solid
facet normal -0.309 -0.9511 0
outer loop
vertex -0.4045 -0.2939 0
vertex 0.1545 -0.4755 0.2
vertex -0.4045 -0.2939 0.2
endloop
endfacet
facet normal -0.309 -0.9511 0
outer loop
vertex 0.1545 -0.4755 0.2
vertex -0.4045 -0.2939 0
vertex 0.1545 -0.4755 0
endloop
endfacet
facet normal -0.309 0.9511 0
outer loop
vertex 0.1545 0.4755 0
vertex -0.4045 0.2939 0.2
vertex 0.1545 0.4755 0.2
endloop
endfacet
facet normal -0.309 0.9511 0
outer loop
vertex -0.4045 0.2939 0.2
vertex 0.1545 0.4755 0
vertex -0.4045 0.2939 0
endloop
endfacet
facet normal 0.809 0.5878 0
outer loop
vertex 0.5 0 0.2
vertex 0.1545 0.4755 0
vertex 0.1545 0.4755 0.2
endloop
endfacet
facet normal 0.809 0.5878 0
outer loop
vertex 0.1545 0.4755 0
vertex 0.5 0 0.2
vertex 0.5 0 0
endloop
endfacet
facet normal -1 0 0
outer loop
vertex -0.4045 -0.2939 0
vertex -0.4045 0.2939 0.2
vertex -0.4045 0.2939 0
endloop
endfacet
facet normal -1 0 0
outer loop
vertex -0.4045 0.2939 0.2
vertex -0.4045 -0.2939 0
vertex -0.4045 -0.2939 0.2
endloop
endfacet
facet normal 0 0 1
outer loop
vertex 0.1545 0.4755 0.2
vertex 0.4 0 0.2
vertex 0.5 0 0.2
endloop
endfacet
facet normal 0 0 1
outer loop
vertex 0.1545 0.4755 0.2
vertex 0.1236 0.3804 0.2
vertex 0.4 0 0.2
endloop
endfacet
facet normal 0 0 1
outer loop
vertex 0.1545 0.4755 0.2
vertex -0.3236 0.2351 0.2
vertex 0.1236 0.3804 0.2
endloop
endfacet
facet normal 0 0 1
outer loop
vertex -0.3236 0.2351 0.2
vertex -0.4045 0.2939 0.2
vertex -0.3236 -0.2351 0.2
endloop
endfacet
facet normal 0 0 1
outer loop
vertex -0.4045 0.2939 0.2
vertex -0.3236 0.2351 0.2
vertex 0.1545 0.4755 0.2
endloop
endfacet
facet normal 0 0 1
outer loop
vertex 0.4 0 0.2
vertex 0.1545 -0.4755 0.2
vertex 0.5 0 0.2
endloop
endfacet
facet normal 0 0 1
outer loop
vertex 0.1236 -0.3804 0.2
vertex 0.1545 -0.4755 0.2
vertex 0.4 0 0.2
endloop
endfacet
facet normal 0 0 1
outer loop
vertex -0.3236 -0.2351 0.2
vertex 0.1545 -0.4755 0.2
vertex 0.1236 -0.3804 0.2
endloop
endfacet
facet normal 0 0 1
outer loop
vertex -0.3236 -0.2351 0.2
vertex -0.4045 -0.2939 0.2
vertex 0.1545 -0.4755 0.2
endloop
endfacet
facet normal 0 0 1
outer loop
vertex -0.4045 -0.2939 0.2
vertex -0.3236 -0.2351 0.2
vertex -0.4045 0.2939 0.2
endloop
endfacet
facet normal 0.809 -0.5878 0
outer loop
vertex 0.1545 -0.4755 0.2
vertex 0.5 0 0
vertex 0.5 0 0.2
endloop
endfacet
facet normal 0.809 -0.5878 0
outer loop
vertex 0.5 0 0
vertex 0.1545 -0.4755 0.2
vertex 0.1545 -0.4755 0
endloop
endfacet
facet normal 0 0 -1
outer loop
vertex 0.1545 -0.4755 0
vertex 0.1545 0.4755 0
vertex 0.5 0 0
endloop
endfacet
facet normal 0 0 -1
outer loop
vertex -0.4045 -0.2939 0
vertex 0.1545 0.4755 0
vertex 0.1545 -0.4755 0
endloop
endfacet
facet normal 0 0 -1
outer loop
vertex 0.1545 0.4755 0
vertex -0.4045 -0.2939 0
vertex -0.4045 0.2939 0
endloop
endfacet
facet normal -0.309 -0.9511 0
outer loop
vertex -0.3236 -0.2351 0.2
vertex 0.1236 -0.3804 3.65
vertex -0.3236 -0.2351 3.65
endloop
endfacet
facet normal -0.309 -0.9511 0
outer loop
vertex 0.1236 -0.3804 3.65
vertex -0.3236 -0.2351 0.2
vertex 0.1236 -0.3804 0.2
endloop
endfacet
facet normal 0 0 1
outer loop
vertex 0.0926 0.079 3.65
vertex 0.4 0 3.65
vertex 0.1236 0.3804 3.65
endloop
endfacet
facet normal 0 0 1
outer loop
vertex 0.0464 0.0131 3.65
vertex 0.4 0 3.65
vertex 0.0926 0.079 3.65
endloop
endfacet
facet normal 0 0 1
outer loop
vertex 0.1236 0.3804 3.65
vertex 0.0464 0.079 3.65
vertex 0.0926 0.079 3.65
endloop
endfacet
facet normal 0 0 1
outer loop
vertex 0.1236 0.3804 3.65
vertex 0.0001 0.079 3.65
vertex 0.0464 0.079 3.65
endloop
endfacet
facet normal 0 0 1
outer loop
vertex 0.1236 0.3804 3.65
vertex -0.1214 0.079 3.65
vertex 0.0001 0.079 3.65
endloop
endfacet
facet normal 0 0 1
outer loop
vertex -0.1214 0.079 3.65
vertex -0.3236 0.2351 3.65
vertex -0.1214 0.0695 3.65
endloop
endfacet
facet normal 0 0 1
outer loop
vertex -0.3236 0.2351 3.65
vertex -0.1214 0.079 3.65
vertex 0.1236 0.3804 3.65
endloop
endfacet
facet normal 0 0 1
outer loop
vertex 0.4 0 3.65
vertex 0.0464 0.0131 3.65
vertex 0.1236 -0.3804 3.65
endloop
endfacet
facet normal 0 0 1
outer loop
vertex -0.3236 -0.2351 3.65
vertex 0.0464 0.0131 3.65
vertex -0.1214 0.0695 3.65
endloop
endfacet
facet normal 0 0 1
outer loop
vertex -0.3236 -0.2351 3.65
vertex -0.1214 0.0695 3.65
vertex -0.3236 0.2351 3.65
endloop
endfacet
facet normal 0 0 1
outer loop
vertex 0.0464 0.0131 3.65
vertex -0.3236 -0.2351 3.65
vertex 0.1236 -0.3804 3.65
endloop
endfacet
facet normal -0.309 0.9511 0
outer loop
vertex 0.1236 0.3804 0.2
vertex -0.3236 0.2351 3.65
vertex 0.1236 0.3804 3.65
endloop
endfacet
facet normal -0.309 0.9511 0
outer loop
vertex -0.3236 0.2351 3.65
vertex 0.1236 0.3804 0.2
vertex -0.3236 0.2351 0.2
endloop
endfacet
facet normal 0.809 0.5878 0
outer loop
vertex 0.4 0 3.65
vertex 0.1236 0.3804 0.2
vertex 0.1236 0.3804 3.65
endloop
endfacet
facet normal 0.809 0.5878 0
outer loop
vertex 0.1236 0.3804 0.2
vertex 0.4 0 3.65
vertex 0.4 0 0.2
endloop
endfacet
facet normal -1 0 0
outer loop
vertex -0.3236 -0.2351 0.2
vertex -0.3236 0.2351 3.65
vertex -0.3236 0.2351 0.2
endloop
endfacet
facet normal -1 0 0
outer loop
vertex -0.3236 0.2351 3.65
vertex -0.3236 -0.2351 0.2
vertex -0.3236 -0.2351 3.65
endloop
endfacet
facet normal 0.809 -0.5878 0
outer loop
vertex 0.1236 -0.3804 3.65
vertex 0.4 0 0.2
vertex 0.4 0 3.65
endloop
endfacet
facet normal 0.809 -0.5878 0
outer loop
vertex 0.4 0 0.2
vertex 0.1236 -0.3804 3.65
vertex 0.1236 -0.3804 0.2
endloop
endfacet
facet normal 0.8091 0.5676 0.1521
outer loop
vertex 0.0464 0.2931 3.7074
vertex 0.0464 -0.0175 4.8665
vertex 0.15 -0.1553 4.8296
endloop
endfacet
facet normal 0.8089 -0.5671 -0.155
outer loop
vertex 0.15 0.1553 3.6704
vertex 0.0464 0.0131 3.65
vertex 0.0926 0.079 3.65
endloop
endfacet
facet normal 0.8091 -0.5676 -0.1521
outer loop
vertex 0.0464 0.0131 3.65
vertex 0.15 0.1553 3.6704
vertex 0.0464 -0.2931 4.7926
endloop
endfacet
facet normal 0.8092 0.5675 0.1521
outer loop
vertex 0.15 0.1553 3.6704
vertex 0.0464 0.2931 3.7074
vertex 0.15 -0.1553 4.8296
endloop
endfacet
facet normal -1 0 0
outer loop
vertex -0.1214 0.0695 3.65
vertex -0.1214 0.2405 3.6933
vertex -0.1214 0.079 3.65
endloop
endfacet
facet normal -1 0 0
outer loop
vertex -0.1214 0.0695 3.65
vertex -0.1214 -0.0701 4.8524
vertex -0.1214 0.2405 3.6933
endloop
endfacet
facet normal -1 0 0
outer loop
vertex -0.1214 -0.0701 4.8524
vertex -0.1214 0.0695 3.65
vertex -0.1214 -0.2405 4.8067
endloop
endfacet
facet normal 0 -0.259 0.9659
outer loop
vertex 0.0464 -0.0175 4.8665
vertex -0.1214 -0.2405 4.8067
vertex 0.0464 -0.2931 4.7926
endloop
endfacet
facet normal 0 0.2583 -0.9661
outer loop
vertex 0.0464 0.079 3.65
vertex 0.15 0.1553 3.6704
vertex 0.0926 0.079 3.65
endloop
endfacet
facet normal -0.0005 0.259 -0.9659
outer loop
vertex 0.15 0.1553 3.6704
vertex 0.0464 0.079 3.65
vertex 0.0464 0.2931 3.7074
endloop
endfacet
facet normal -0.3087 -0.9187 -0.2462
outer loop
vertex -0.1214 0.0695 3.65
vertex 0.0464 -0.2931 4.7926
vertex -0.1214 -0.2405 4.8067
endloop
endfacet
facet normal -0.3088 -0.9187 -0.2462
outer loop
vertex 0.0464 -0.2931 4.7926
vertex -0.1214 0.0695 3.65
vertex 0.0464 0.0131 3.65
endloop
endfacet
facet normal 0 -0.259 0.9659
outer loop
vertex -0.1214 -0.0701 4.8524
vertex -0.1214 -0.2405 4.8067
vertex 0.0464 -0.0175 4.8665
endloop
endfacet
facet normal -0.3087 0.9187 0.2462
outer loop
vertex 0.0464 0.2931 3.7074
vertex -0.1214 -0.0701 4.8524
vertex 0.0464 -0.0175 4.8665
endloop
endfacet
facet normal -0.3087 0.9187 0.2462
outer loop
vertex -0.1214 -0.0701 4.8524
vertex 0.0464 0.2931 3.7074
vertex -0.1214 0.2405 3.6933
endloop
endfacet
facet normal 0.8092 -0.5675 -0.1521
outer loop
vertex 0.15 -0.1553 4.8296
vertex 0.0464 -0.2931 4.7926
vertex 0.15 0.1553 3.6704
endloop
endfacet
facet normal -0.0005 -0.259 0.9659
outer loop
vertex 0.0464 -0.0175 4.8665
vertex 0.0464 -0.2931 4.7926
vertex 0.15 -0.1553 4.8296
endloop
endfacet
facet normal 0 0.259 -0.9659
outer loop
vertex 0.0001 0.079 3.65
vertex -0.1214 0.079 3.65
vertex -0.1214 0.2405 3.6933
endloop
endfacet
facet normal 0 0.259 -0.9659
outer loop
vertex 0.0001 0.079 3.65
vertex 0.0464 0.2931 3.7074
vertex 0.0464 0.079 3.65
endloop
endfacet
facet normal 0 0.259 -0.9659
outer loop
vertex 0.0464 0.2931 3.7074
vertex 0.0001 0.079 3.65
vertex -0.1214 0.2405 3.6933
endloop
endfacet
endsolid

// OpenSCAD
// Parameters
body_diameter_mm = 0.8; //[0.4:1.6:0.05]
overall_height_mm = 4.7; //[2.35:9.4:0.1]
body_height_mm = 3.5; //[1.75:7:0.1]
lever_height_mm = 1.2; //[0.6:2.4:0.05]
lever_diameter_mm = 0.3; //[0.15:0.6:0.02]
base_flange_diameter_mm = 1; //[0.5:2:0.05]
base_flange_thickness_mm = 0.2; //[0.1:0.4:0.02]
overlap_mm = 0.05; //[0.02:0.2:0.01]
toggle_tilt_deg = 15; //[0:35:1]

// Toggle switch - complete geometry
module toggle() {
  // Base flange
  color("Silver") {
    translate([0, 0, base_flange_thickness_mm / 2])
      cylinder(r=base_flange_diameter_mm / 2, h=base_flange_thickness_mm, center=true);
  }
  
  // Cylindrical body
  color("DimGray") {
    translate([0, 0, base_flange_thickness_mm + body_height_mm / 2 - overlap_mm])
      cylinder(r=body_diameter_mm / 2, h=body_height_mm, center=true);
  }
  
  // Actuator lever
  color("Black") {
    translate([0, 0, base_flange_thickness_mm + body_height_mm + lever_height_mm / 2 - overlap_mm])
      rotate([toggle_tilt_deg, 0, 0])
      cylinder(r=lever_diameter_mm / 2, h=lever_height_mm, center=true);
  }
}

// Assembly
module assembly() {
  toggle();
}

assembly();
